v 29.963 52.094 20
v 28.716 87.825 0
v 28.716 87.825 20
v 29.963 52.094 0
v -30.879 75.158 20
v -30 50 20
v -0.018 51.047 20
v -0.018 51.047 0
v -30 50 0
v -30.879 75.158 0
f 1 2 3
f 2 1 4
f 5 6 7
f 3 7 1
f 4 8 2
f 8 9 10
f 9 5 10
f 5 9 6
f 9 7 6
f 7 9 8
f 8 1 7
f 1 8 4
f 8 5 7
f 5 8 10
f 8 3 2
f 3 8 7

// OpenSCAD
translate([-30,50,0])
scale([3,3,1])
rotate([0,0,+2]) {
    difference() {
        cube([20, 20, 20]);
        translate([10, 0, -1]) {
            rotate([0,0,50]) {
                cube([30, 30, 30]);
            }
        }
    }
}
